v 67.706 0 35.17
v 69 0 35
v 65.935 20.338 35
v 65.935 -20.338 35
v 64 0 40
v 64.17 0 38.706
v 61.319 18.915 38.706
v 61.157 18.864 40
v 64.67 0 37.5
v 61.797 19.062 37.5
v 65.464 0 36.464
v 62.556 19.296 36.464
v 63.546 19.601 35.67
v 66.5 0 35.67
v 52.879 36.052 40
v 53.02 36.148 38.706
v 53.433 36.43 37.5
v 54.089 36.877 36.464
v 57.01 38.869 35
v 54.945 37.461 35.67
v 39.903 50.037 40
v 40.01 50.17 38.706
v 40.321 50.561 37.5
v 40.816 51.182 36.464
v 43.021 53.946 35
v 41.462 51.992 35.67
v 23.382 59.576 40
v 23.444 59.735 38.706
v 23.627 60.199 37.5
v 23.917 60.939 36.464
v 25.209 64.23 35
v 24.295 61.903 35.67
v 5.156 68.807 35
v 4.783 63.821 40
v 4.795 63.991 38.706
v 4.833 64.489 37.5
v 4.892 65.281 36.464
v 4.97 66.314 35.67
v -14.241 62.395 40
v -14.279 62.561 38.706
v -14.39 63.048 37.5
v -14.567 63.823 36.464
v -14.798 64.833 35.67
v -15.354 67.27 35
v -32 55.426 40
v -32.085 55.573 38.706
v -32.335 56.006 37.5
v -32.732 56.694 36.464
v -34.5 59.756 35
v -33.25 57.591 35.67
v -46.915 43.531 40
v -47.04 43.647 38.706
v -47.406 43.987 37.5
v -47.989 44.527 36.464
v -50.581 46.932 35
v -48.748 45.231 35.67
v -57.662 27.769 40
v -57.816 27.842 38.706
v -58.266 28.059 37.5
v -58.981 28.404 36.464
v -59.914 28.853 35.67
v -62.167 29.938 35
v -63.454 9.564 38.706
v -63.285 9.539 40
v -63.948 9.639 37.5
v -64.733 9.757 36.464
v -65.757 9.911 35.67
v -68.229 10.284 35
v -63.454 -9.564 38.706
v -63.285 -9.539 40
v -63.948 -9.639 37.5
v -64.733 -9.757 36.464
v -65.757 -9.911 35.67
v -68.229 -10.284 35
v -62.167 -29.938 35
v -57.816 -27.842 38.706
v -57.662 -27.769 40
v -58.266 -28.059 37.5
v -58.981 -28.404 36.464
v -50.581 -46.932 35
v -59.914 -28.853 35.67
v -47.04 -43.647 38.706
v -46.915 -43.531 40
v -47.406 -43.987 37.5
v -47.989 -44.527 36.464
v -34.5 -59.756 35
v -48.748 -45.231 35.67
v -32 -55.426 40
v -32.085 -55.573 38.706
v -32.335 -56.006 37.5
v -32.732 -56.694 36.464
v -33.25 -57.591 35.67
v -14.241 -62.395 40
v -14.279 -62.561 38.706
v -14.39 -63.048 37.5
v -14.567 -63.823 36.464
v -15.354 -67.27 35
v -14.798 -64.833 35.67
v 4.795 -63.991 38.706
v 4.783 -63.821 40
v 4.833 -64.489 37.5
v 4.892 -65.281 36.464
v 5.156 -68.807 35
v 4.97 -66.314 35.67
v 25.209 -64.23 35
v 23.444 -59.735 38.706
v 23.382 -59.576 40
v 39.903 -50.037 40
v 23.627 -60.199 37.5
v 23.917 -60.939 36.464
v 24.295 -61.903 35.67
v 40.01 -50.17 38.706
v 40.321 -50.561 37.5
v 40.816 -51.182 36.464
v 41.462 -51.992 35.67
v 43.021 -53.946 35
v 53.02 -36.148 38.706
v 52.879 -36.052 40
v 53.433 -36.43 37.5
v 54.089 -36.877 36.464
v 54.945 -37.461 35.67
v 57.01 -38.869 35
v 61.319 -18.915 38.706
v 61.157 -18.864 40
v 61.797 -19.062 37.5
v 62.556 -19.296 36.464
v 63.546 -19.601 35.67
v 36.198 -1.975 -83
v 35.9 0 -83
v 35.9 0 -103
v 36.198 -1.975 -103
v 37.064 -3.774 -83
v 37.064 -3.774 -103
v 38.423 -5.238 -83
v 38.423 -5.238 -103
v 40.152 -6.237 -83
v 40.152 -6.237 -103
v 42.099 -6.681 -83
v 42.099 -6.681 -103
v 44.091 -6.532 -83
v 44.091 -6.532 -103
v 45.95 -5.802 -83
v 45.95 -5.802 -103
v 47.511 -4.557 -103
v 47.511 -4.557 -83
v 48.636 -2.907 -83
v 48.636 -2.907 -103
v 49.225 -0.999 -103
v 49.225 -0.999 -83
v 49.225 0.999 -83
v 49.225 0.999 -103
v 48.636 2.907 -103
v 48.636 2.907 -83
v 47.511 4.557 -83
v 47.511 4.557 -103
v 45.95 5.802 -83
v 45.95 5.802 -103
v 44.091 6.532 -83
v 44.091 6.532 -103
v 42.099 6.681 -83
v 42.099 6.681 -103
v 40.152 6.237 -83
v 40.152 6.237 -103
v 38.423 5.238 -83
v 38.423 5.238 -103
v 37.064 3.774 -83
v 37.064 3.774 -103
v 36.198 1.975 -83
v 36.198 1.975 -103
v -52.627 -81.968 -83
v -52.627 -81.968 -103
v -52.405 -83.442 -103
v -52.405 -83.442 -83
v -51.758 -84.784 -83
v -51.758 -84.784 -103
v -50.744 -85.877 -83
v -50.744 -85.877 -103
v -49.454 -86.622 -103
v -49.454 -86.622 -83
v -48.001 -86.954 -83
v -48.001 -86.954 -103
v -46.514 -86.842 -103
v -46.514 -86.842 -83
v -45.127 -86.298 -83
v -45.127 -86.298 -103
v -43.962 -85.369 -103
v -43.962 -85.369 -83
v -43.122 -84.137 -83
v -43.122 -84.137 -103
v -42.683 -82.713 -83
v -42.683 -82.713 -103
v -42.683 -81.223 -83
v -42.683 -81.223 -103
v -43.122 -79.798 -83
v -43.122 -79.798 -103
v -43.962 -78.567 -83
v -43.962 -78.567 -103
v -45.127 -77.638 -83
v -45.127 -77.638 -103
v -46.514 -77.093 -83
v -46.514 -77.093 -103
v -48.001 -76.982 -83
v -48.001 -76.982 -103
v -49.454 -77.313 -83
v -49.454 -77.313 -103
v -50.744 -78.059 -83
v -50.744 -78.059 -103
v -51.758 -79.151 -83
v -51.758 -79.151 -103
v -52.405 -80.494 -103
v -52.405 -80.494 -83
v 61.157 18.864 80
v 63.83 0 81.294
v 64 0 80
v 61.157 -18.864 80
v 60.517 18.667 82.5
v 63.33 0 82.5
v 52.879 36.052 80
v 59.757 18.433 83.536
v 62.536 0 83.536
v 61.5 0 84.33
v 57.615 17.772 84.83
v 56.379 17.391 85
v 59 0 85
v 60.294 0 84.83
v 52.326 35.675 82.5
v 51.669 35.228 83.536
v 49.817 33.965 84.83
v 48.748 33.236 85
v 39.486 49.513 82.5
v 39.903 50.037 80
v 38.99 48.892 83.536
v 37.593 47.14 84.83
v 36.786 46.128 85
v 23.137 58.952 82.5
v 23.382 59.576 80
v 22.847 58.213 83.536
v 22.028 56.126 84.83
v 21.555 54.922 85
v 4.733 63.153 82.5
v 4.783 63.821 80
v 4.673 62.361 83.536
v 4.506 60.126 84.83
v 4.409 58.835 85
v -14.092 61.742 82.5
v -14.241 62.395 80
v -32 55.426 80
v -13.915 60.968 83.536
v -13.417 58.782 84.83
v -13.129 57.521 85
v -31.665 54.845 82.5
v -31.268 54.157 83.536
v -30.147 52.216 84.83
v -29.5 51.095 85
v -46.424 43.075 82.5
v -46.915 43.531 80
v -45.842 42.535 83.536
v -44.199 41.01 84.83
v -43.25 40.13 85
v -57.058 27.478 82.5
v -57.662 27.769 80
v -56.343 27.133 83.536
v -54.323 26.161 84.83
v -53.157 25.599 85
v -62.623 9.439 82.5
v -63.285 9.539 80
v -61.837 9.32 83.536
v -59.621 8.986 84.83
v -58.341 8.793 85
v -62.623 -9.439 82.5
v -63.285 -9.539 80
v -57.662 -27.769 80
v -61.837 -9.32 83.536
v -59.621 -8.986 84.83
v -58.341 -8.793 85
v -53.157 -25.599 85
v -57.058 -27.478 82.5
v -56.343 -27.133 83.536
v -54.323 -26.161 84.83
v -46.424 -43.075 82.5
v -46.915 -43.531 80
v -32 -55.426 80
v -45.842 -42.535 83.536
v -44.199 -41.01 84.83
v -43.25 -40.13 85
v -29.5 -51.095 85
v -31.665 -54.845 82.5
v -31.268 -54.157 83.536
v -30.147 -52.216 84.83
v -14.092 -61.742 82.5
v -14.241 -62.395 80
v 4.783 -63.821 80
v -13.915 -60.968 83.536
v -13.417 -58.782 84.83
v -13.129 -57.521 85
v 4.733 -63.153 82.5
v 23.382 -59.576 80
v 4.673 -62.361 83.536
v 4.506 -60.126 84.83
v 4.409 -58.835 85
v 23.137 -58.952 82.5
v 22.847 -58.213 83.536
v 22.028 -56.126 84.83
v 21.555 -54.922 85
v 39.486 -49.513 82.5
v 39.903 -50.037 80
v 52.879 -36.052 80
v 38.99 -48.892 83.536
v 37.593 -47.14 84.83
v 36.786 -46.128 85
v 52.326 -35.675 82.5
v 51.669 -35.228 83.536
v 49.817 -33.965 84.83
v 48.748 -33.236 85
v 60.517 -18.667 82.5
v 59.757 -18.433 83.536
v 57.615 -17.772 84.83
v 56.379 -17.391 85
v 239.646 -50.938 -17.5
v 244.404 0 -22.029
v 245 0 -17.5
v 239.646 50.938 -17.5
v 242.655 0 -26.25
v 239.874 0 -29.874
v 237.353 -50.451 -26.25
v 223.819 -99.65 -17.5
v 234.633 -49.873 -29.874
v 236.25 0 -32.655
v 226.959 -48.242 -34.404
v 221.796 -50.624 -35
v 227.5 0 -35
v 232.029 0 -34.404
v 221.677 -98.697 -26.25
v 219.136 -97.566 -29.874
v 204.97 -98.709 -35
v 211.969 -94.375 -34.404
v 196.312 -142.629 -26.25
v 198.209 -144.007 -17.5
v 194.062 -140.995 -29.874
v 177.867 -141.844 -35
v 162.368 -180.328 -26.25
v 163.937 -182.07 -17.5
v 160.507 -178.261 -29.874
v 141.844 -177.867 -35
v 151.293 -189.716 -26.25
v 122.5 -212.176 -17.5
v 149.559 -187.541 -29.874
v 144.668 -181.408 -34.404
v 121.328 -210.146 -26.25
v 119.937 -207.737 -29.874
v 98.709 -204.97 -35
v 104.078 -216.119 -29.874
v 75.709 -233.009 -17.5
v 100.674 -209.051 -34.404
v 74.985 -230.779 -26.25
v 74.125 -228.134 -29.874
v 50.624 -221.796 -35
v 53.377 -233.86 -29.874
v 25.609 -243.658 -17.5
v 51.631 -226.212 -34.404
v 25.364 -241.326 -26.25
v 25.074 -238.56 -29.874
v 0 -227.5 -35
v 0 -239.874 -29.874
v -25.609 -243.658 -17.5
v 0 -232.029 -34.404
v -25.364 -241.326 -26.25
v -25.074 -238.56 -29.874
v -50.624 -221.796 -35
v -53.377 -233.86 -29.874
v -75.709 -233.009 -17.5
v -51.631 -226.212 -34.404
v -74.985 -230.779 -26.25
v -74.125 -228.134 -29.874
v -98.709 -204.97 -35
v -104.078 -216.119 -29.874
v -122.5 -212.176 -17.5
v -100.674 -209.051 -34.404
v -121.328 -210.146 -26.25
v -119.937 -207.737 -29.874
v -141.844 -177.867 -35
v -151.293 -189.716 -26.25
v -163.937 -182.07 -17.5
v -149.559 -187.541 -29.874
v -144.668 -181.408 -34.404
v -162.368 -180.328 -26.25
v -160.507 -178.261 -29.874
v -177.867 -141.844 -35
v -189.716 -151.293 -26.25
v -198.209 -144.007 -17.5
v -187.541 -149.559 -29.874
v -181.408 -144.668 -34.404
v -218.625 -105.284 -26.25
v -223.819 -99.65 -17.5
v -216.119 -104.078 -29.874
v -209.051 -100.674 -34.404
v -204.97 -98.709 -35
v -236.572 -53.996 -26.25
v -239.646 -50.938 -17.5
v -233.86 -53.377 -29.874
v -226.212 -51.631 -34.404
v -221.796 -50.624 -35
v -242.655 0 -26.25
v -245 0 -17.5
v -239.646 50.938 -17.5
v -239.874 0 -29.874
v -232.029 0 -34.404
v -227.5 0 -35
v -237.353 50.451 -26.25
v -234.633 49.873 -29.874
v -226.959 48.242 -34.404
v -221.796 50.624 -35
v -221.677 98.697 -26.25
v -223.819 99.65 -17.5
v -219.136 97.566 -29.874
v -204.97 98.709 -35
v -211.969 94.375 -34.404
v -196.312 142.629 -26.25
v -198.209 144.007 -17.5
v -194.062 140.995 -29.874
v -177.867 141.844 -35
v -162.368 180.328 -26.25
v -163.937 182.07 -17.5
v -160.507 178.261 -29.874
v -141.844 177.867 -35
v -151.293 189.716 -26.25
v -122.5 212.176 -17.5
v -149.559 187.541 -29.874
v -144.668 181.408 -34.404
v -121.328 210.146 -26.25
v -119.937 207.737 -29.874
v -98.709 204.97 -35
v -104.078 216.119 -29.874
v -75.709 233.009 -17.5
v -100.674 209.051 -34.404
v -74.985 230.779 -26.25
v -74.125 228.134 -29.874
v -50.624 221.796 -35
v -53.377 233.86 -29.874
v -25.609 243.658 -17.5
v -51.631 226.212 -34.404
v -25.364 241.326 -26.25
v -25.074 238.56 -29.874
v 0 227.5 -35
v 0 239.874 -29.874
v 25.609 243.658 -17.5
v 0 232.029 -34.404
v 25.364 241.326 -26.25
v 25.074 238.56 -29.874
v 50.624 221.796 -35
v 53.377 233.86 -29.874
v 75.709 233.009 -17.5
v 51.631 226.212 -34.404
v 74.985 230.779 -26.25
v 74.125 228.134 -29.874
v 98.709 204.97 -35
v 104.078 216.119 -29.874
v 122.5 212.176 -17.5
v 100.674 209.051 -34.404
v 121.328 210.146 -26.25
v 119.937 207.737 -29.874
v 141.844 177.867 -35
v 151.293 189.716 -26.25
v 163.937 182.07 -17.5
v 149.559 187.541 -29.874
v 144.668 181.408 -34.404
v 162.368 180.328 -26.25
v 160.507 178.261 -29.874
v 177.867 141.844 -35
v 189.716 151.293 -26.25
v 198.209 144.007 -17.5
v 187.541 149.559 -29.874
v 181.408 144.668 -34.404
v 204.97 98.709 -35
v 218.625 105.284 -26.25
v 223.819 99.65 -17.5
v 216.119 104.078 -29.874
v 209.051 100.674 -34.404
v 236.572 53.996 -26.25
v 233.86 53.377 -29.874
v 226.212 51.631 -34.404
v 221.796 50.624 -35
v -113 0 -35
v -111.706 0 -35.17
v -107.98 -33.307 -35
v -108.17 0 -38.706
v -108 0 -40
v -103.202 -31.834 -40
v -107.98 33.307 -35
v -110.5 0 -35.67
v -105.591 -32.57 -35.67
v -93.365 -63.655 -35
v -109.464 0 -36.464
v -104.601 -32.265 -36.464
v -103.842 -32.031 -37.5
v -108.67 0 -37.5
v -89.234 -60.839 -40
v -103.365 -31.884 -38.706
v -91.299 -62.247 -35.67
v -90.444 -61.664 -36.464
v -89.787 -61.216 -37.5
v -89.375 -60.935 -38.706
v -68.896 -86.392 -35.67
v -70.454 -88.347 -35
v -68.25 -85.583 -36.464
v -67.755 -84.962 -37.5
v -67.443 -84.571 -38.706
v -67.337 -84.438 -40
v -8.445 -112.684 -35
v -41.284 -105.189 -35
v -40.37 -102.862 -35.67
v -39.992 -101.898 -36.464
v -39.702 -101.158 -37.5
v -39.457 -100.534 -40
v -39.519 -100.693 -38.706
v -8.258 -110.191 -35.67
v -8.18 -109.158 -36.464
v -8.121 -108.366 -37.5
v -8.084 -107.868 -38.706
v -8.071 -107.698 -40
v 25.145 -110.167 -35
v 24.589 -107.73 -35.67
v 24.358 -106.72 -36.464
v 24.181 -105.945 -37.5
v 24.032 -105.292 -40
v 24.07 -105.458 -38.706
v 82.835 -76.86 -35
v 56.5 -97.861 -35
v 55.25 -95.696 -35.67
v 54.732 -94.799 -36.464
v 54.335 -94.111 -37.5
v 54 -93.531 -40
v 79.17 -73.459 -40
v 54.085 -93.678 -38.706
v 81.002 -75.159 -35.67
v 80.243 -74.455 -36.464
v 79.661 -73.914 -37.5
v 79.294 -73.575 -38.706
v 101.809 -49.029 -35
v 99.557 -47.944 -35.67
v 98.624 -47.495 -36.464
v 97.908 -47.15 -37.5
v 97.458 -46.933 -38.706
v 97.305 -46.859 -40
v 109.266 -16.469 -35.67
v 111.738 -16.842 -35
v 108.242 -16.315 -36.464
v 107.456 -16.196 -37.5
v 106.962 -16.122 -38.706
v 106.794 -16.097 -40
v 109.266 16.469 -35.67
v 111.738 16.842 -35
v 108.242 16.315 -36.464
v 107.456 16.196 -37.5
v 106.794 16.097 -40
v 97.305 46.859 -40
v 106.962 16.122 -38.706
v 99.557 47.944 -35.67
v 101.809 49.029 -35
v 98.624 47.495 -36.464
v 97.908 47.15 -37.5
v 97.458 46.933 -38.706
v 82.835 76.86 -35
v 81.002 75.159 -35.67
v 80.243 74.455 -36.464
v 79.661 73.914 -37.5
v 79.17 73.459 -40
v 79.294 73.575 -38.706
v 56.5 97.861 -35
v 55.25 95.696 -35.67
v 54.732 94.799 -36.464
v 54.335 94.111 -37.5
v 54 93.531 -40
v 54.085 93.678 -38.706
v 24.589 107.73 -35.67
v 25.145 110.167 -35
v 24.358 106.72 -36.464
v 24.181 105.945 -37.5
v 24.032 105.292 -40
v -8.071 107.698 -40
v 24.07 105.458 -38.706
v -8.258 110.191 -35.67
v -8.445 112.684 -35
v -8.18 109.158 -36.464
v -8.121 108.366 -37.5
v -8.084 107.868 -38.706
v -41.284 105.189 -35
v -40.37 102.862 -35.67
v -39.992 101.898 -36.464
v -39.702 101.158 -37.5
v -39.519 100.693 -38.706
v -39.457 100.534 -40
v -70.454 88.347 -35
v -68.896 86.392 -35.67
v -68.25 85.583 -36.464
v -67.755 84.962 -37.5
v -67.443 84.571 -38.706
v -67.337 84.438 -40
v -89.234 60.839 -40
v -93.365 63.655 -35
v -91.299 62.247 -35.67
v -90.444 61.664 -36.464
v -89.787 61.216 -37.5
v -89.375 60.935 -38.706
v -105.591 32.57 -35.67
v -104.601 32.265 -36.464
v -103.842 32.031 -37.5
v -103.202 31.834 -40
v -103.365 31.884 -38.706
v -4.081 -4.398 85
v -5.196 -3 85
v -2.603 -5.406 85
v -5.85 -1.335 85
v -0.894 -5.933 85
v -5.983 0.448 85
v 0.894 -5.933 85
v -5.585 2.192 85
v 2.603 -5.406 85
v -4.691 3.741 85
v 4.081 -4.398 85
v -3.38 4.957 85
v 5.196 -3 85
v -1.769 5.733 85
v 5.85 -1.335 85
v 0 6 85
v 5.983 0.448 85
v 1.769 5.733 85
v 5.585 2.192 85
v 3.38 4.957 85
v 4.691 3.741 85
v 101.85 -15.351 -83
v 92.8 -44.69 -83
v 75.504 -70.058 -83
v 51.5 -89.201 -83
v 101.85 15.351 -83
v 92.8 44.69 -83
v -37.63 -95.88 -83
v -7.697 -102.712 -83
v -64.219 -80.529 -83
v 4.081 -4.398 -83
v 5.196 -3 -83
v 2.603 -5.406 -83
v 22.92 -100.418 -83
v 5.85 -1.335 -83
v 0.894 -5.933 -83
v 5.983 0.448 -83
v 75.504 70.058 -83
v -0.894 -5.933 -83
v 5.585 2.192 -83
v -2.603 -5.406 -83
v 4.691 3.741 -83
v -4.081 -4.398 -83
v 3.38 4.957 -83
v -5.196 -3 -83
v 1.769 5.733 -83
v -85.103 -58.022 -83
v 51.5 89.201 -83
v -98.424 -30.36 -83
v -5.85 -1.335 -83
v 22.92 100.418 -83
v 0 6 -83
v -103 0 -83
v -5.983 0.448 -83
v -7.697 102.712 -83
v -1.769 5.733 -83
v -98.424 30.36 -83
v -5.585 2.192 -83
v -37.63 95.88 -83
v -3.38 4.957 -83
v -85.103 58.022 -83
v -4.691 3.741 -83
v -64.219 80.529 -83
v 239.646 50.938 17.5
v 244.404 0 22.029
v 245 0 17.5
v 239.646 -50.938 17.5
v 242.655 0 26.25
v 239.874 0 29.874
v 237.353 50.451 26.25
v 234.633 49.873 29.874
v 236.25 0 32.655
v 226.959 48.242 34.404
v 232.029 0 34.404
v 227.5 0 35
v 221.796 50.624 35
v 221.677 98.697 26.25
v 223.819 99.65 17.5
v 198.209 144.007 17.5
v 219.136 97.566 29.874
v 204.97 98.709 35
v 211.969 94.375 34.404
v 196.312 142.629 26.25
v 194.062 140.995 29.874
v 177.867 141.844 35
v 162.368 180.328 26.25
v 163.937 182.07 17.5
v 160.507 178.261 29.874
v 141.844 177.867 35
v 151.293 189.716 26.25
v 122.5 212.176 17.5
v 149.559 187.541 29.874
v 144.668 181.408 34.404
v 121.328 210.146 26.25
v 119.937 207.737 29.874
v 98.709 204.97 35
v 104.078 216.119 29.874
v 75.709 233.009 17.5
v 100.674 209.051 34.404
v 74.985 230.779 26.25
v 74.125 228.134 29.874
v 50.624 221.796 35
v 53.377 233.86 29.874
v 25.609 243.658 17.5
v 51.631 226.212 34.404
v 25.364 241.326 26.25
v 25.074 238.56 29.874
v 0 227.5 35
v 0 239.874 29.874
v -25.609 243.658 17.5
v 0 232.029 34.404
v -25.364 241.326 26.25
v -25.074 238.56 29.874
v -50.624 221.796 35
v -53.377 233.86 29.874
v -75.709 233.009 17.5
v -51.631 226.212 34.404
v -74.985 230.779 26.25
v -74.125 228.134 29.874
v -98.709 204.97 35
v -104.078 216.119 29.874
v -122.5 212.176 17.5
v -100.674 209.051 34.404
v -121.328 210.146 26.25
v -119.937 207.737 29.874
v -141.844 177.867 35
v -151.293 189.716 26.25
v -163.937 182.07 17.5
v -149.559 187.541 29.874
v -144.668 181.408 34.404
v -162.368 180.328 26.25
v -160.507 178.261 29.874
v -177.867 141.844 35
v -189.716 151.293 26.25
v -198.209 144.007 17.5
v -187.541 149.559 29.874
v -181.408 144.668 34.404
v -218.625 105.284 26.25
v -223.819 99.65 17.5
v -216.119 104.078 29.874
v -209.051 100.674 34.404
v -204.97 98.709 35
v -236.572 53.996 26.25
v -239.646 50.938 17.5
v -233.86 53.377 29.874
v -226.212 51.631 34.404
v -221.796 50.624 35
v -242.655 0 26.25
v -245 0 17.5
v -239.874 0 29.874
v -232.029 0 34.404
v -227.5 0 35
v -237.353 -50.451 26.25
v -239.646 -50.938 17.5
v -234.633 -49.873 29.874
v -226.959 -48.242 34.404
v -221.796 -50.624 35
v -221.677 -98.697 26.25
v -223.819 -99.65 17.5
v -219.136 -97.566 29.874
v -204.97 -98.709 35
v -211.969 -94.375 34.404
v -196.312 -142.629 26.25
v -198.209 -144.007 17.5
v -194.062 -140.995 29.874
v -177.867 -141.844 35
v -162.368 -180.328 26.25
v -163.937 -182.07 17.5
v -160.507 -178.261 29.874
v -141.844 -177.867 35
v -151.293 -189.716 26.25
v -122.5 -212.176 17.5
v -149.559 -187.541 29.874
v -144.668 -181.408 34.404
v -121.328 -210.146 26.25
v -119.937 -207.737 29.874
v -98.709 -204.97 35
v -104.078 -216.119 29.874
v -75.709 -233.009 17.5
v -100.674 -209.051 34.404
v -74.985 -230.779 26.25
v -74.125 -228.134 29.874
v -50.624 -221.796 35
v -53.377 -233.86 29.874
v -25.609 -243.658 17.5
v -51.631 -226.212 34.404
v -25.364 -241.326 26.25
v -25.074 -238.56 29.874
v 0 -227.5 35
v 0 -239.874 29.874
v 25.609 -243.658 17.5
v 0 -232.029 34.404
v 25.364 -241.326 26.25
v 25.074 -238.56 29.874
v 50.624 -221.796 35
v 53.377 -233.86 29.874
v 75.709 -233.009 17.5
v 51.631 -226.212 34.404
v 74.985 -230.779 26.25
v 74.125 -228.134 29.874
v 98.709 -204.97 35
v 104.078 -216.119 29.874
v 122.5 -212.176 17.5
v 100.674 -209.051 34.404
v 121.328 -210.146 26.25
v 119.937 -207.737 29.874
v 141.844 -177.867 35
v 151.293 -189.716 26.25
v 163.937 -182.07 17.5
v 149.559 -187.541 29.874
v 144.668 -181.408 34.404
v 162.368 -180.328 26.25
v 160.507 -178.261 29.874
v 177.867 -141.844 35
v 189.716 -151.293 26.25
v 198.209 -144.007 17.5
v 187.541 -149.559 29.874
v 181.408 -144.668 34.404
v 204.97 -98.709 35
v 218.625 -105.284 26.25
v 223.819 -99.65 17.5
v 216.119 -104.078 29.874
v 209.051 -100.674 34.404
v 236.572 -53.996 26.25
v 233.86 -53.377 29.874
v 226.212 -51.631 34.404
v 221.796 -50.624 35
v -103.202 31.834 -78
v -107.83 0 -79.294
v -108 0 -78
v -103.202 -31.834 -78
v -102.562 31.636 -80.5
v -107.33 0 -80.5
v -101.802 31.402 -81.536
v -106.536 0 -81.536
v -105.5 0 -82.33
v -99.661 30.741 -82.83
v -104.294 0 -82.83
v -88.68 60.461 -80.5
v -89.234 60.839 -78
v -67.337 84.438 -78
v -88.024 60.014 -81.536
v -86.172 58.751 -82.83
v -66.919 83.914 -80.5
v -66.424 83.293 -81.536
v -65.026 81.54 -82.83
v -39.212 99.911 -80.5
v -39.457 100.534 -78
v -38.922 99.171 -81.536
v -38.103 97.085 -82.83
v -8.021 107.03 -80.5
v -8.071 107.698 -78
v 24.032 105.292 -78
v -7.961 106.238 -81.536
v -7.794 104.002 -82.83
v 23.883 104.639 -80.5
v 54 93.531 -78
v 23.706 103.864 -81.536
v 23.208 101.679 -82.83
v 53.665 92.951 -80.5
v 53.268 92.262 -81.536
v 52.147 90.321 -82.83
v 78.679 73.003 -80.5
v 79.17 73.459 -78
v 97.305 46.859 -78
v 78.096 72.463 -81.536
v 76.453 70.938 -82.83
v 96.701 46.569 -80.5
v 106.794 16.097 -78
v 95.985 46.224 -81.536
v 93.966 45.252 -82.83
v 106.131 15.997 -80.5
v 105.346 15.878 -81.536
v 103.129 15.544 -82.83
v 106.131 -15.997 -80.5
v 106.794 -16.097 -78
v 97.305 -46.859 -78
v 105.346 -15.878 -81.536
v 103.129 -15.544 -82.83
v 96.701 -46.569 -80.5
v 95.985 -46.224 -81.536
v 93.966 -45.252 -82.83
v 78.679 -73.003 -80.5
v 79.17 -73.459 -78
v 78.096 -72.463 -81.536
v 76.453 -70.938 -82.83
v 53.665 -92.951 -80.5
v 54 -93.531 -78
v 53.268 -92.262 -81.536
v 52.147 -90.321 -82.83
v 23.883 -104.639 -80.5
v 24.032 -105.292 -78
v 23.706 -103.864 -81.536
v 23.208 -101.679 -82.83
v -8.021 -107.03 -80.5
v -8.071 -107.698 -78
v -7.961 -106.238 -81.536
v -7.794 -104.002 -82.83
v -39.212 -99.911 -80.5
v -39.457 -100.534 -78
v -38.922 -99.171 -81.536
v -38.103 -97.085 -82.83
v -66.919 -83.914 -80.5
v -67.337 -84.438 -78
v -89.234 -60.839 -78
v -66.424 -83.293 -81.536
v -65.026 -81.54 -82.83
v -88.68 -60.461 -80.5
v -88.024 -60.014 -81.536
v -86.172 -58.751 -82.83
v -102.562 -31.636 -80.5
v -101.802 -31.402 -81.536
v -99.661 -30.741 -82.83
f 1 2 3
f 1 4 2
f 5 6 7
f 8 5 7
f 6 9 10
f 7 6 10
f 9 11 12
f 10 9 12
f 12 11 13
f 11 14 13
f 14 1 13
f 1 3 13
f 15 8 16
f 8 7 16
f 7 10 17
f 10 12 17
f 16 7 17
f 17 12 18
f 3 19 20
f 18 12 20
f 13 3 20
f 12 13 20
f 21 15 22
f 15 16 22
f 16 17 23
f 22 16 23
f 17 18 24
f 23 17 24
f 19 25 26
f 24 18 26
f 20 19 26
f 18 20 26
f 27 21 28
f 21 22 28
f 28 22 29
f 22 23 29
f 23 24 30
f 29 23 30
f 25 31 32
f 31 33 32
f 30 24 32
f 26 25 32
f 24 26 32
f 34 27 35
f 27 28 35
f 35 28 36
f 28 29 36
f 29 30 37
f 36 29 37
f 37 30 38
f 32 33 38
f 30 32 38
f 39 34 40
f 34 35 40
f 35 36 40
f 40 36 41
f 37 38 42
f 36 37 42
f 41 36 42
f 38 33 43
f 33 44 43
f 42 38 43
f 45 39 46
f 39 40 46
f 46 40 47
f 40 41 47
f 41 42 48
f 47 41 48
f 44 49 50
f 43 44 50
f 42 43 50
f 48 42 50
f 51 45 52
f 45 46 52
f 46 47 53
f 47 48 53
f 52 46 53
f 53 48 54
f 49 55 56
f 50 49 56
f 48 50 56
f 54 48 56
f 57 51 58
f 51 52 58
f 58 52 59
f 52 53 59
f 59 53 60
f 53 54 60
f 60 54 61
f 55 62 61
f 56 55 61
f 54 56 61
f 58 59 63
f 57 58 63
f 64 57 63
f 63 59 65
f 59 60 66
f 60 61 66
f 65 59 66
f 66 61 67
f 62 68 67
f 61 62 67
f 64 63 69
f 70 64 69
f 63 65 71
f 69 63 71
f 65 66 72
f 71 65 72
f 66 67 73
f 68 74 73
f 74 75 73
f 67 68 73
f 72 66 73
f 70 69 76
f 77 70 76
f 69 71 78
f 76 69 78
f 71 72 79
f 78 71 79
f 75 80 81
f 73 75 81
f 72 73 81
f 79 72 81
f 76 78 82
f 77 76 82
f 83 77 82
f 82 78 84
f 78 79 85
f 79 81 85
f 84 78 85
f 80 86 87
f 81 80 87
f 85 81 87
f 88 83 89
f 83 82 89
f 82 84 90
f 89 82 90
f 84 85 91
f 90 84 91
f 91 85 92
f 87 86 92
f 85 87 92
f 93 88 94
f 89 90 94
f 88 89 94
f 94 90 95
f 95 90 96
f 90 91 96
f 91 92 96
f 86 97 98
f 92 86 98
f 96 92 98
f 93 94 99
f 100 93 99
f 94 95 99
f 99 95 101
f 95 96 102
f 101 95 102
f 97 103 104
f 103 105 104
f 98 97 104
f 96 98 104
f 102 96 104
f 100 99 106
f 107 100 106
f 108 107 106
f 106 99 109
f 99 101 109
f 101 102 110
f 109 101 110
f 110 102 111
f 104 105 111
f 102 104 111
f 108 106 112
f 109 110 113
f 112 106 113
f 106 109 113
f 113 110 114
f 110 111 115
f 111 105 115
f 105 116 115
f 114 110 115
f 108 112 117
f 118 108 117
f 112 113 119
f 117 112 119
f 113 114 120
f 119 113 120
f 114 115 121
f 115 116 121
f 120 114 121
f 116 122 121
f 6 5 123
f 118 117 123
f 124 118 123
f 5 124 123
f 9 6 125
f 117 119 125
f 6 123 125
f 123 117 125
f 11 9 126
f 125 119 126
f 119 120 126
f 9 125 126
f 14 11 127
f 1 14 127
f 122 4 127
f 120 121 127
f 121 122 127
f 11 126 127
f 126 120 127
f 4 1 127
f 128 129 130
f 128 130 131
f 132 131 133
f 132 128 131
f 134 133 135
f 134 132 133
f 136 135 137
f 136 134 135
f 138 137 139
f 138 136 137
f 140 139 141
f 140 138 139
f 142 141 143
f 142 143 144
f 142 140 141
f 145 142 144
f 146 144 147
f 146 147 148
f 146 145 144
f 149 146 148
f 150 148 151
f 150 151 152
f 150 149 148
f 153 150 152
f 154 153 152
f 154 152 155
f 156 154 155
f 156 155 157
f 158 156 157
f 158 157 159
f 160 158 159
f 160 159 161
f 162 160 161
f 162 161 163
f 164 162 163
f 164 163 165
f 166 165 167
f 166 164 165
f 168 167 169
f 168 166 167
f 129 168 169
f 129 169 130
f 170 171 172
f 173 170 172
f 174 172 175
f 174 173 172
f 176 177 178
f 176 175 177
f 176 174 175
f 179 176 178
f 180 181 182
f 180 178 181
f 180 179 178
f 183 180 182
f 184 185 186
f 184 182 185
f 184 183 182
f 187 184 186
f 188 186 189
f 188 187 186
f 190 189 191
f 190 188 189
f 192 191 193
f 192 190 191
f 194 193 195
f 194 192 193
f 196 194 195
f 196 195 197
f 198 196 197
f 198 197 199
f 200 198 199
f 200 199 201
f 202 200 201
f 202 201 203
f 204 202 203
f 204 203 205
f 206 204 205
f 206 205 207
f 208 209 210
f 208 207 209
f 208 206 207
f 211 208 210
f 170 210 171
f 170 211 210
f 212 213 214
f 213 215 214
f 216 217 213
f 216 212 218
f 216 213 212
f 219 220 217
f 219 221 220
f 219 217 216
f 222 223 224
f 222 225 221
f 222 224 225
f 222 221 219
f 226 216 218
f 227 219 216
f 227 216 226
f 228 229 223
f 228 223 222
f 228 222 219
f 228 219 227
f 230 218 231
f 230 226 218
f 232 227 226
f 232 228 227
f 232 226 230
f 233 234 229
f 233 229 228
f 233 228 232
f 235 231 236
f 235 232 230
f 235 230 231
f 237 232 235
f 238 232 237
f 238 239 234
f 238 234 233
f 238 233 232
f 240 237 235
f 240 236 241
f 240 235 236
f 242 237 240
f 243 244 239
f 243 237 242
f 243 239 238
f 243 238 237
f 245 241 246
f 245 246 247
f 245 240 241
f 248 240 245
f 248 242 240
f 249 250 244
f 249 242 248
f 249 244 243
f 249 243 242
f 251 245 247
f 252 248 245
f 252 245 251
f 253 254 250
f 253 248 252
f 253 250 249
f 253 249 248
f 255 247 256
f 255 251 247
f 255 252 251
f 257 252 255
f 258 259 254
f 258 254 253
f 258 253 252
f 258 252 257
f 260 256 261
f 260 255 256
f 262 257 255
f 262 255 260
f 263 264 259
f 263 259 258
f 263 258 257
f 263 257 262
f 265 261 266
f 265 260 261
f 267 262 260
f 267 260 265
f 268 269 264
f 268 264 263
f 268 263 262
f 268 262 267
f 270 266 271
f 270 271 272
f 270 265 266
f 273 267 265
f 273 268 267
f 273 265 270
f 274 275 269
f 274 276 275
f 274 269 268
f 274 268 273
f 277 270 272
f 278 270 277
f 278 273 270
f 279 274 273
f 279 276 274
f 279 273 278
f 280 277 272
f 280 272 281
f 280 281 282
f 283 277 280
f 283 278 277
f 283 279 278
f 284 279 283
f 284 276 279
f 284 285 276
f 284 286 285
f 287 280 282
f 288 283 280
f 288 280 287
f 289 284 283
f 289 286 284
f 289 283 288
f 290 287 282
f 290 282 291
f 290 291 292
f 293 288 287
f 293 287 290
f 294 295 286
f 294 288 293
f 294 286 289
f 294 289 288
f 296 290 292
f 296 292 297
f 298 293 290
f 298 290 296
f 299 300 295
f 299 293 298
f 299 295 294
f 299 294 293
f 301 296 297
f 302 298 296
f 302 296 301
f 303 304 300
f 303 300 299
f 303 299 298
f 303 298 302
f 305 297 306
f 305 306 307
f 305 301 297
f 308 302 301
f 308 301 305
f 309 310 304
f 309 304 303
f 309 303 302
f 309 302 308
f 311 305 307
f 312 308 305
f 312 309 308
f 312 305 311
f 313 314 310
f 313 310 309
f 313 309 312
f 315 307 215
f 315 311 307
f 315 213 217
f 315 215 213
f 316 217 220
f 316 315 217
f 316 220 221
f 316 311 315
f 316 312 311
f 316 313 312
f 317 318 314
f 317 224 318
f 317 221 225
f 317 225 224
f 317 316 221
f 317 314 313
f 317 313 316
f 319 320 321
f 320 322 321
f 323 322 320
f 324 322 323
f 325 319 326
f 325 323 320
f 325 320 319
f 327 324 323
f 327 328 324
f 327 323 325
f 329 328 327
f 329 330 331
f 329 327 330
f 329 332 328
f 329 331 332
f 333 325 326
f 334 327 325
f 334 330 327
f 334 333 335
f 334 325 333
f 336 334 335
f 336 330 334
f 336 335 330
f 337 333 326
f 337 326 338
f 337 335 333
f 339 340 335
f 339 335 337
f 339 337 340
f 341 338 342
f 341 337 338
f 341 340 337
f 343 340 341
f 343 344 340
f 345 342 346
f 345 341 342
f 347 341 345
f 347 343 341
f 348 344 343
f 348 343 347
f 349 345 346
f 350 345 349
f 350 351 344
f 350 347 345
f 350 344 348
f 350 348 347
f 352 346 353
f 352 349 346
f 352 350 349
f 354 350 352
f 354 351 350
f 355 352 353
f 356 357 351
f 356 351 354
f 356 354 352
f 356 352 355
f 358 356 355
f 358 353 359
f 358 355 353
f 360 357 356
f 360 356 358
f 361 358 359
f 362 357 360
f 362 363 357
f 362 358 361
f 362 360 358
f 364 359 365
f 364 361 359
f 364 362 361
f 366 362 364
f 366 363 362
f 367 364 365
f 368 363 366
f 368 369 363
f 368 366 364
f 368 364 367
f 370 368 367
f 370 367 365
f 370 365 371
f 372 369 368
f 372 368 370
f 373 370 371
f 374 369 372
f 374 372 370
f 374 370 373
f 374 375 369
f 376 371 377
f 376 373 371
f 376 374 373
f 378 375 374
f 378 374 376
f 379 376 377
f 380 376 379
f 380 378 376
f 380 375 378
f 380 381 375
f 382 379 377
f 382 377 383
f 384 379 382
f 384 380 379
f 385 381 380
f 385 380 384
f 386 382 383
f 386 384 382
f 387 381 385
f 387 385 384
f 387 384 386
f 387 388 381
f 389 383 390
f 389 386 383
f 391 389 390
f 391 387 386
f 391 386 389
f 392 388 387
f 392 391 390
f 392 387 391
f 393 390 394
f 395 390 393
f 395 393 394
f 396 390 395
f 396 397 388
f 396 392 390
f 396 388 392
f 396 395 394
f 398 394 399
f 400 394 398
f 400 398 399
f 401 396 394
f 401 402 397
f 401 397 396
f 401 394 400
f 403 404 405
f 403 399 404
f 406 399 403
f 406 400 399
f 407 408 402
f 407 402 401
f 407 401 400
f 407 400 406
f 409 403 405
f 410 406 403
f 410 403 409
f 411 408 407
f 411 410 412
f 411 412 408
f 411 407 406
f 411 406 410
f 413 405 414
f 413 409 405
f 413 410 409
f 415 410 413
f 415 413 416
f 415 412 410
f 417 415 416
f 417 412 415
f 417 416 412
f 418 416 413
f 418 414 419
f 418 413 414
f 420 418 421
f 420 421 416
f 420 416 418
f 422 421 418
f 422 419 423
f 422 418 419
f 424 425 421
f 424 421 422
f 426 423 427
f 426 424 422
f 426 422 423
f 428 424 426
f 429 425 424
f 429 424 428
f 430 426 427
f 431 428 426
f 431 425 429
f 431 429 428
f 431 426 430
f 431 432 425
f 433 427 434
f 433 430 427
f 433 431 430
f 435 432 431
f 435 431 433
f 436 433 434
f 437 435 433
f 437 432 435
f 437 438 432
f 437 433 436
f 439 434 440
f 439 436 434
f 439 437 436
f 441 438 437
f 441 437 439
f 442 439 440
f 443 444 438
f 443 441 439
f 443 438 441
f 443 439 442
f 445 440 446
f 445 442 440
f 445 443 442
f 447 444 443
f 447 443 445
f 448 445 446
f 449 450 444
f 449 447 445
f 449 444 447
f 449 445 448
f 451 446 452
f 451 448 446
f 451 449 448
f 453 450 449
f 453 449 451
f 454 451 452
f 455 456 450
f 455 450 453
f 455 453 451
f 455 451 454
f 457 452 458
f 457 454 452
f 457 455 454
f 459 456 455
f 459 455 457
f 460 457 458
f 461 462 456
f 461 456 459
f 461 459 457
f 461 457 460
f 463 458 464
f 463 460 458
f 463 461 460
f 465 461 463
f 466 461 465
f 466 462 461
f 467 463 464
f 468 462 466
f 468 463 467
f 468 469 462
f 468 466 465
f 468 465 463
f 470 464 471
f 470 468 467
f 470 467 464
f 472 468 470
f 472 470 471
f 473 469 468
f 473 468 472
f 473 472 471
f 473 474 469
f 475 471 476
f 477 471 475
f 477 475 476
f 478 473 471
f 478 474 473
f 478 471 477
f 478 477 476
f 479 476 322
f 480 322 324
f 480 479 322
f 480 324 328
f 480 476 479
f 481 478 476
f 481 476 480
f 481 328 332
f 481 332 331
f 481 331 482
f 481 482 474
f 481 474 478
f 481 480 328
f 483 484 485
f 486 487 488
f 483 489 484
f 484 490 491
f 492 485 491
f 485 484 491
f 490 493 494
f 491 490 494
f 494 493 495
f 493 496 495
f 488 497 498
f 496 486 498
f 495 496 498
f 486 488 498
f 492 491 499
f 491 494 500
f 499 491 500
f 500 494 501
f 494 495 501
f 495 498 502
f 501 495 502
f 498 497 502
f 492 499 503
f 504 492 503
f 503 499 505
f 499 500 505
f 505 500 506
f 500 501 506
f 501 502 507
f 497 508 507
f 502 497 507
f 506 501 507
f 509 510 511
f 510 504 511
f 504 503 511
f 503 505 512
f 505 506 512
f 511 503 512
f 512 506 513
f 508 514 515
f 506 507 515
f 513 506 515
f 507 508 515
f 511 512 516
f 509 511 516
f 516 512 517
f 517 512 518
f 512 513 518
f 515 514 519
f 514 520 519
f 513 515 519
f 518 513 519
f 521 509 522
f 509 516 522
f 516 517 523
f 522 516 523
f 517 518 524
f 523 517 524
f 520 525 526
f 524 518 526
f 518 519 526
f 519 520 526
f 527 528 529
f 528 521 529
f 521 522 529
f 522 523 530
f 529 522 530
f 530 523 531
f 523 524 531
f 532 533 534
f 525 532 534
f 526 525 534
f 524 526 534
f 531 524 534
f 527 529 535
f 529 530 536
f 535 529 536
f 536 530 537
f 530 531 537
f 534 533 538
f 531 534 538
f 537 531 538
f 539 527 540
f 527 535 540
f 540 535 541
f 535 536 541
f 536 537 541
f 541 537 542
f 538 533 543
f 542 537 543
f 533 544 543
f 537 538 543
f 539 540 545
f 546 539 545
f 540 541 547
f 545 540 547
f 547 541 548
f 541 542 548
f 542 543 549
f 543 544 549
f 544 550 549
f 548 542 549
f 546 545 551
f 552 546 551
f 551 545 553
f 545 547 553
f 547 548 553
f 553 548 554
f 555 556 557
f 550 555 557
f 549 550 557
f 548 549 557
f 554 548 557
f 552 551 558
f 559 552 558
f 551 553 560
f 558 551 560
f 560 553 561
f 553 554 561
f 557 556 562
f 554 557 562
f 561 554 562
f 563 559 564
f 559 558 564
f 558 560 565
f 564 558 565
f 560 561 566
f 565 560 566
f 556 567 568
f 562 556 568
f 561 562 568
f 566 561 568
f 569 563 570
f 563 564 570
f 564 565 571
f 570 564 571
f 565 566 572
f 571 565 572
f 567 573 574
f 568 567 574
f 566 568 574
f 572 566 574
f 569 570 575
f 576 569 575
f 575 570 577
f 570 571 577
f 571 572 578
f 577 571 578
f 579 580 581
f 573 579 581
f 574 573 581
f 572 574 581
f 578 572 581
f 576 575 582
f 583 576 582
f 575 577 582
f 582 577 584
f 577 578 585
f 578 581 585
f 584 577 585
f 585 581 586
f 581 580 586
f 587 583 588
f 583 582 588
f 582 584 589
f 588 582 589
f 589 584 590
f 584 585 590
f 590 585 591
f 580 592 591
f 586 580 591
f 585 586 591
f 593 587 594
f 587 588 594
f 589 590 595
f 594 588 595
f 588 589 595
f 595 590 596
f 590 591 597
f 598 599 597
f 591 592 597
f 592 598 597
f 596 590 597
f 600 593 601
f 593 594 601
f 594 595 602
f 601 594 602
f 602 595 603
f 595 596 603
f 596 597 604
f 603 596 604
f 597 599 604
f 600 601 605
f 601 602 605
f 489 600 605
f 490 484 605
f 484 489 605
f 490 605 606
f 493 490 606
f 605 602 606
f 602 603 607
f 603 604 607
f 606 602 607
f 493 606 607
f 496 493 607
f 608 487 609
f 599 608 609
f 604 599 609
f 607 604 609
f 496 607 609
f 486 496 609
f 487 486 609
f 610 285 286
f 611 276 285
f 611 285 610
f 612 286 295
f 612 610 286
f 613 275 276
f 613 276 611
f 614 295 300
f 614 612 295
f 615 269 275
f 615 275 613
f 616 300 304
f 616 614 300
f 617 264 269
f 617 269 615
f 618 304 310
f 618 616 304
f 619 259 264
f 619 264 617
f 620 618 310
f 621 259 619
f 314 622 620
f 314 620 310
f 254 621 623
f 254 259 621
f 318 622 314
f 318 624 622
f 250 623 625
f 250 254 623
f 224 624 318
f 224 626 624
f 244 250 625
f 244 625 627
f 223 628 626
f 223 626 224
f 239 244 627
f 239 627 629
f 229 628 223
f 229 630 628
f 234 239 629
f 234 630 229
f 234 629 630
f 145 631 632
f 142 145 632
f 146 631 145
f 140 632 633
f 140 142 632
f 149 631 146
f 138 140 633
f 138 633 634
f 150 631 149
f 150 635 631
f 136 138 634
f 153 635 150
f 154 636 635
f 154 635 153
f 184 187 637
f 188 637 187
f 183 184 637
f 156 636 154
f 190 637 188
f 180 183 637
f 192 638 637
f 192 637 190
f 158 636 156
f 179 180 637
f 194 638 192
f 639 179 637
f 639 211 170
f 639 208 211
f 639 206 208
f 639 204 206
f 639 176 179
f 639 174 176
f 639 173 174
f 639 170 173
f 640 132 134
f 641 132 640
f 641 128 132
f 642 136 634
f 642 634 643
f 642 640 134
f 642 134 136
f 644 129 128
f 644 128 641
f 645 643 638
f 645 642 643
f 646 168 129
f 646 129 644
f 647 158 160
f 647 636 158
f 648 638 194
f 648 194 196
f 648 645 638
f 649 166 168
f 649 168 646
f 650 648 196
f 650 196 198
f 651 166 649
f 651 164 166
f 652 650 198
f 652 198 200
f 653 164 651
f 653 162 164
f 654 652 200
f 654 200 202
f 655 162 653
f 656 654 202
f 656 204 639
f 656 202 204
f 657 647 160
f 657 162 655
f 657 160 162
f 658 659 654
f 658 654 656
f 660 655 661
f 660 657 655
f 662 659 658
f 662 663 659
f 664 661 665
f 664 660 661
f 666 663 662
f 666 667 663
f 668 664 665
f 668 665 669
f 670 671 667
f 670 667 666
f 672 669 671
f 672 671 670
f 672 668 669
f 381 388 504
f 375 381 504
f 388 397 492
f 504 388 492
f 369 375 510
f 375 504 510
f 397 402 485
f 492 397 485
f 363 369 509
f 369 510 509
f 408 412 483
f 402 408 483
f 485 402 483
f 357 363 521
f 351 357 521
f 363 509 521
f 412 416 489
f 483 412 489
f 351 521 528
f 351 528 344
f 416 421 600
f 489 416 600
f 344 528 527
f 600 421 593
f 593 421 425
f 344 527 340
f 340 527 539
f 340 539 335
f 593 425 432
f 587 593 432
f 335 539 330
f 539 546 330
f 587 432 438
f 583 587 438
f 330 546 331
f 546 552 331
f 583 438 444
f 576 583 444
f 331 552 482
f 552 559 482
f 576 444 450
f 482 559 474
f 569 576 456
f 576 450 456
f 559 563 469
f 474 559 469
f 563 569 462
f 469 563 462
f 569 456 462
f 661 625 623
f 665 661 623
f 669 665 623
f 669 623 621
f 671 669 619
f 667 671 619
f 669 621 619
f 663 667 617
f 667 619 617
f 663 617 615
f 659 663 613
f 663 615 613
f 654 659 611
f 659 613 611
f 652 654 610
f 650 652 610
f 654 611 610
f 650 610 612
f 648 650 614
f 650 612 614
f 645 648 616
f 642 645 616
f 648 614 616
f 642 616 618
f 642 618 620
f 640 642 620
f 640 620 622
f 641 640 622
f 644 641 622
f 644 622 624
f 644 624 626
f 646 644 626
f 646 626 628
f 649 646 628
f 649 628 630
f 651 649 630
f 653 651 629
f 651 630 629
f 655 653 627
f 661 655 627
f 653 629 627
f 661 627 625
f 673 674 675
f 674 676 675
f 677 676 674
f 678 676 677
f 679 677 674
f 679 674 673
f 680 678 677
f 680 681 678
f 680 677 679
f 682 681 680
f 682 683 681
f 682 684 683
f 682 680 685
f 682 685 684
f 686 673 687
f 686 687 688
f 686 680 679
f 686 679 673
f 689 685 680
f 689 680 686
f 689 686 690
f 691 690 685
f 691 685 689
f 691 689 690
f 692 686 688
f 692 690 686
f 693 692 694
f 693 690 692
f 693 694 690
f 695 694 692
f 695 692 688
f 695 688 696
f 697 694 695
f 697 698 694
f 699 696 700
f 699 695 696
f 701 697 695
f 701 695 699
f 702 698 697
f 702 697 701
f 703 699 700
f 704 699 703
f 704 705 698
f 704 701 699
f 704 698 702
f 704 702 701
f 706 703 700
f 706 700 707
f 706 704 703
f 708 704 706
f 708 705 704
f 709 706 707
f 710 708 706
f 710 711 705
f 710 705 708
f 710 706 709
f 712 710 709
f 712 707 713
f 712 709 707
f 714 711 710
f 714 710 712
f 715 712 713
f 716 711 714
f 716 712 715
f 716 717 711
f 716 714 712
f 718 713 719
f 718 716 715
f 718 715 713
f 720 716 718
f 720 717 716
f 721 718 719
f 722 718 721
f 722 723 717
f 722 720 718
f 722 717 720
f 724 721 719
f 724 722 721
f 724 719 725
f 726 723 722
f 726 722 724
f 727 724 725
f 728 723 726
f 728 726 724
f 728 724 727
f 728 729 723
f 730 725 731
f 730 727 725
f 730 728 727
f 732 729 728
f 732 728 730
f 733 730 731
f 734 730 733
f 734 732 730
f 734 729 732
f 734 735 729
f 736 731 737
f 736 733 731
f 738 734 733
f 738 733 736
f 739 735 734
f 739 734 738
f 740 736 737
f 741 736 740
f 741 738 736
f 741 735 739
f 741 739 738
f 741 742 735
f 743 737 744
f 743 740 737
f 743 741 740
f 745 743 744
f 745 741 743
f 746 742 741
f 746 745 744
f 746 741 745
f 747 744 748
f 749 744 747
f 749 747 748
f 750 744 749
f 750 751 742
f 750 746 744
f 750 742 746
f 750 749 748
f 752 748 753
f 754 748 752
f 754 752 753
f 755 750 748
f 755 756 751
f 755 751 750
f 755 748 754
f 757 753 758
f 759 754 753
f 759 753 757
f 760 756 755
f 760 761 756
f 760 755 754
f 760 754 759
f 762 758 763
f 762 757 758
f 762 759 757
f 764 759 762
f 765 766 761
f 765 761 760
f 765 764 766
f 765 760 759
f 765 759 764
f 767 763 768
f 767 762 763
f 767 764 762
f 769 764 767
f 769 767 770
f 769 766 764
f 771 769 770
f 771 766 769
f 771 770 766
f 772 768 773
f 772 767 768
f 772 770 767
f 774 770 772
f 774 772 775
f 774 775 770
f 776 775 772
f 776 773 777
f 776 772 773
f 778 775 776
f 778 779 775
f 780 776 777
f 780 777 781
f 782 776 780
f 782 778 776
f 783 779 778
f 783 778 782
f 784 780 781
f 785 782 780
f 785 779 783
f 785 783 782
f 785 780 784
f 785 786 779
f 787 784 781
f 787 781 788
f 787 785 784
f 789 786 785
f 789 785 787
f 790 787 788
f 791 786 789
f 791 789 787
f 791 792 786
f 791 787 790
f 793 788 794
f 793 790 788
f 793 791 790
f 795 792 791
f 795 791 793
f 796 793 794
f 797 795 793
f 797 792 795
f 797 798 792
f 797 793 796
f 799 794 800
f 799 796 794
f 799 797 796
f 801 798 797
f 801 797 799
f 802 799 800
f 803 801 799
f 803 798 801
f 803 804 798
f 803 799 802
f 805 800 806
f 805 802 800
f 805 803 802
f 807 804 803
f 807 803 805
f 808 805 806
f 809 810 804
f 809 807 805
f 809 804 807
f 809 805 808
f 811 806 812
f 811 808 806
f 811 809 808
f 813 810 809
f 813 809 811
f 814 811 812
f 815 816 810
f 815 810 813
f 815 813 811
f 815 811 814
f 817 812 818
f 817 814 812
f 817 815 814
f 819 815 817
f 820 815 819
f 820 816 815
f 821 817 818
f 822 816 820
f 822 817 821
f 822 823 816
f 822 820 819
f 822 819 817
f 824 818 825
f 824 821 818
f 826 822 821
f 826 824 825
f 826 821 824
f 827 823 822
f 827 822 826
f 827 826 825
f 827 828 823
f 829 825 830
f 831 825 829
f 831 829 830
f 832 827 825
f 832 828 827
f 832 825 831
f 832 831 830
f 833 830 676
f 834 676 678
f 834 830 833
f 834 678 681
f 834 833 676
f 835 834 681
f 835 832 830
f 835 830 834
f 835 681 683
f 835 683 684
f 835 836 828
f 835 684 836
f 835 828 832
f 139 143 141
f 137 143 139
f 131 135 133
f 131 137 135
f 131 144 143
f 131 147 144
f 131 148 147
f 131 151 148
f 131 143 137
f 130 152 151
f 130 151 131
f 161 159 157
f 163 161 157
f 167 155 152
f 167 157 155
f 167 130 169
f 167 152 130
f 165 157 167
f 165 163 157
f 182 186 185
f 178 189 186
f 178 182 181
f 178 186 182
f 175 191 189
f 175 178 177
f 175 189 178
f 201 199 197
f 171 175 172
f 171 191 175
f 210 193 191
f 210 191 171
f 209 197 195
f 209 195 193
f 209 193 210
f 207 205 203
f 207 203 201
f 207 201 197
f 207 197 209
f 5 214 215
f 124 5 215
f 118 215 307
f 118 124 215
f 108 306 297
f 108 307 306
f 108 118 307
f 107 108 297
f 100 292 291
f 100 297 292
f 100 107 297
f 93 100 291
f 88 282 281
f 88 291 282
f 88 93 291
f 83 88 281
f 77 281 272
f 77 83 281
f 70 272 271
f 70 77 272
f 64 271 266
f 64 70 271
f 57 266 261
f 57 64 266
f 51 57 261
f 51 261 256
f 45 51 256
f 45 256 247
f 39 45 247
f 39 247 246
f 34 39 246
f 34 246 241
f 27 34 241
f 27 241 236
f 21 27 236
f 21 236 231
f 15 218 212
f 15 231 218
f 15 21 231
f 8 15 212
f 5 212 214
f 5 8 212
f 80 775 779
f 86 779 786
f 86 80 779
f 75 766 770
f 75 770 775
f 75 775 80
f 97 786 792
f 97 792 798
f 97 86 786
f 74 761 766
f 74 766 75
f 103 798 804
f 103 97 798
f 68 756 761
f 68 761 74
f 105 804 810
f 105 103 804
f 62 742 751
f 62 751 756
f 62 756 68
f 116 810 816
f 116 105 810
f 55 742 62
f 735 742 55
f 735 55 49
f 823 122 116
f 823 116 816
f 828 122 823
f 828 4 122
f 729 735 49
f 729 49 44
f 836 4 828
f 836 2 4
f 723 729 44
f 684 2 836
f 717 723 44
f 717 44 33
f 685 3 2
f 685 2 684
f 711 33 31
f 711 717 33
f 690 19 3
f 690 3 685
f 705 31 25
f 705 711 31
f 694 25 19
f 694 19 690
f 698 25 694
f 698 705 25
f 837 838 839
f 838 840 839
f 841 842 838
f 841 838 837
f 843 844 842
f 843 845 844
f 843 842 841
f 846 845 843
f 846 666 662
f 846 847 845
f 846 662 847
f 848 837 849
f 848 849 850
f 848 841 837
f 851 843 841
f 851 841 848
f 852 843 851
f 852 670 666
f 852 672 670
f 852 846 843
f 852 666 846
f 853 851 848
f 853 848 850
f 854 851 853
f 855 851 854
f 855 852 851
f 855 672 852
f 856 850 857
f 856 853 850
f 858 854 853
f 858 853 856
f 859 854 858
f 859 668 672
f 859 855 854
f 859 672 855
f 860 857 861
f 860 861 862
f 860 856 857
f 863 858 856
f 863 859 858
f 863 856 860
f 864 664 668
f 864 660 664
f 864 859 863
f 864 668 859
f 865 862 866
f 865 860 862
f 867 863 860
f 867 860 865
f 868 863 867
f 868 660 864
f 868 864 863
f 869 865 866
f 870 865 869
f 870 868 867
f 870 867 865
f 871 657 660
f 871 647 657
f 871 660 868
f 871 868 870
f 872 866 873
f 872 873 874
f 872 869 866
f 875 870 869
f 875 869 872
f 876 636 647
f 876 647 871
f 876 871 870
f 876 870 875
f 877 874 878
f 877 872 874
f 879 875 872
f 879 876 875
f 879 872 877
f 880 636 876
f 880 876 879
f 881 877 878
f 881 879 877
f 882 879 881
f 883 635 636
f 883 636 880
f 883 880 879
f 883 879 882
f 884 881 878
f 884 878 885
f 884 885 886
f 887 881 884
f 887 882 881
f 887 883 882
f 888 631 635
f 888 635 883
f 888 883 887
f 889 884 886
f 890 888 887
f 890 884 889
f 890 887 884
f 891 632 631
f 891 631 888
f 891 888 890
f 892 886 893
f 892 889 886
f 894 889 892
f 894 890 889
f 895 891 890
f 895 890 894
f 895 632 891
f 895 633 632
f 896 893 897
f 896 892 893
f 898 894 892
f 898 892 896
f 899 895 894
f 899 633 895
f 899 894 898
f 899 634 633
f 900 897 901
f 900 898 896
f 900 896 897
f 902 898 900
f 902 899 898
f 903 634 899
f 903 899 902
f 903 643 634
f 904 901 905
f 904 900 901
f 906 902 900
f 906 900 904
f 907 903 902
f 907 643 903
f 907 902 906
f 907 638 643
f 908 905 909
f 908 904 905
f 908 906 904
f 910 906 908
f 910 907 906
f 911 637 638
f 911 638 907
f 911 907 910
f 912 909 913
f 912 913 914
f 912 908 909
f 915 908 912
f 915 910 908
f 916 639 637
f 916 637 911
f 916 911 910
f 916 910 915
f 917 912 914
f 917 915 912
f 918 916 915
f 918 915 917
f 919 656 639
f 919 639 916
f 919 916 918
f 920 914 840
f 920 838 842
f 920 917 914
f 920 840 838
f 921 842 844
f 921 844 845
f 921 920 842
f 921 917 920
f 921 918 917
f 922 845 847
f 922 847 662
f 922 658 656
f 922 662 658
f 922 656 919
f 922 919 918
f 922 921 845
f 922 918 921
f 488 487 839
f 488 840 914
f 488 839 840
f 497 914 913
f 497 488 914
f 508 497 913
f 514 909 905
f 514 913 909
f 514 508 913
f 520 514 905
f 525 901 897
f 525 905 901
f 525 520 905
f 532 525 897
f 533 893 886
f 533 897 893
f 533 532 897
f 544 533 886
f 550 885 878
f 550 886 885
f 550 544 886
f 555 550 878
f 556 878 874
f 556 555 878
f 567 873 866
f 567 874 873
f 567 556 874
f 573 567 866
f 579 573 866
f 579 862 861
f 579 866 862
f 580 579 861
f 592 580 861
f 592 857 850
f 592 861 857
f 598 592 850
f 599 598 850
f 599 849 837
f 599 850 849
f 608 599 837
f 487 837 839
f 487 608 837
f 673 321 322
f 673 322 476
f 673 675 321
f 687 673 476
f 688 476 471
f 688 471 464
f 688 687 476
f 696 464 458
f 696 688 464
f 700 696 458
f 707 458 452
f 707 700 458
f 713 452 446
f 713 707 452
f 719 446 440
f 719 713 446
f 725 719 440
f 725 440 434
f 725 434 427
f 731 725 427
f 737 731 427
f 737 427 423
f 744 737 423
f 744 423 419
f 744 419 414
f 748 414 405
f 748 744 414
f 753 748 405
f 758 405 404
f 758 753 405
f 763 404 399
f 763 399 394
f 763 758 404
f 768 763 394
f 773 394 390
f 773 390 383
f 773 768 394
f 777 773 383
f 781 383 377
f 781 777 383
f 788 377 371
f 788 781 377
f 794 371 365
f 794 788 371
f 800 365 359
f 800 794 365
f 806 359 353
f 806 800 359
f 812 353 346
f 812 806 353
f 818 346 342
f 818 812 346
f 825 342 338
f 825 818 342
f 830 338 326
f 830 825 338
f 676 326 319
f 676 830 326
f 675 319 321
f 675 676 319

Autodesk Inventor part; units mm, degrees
ref_plane "YZ Plane" through (0, 0, 0) normal (1, 0, 0) x (0, 1, 0)
ref_plane "XY Plane" through (0, 0, 0) normal (0, 0, 1) x (1, 0, 0)
sketch "スケッチ1" plane through (0, 0, 0) normal (0, 0, 1) x (1, 0, 0)
  circle A0 centre (0, 0) radius 245
  dimension "d0" = 490
extrude "押し出し1" add sketch "スケッチ1" along normal mid plane 70
fillet "フィレット1" radius 17.5 2 edges at (-245, 0, 35) (-245, 0, -35)
sketch "スケッチ8" plane through (0, 0, 35) normal (0, 0, 1) x (1, 0, 0)
  circle A0 centre (0, 0) radius 64
  dimension "d11" = 128
extrude "押し出し2" add sketch "スケッチ8" along normal blind 50
sketch "スケッチ9" plane through (0, 0, -35) normal (0, 0, -1) x (-1, 0, 0)
  circle A0 centre (0, 0) radius 108
  dimension "d14" = 216
extrude "押し出し3" add sketch "スケッチ9" along normal blind 48
fillet "フィレット2" radius 5 1 edges at (-64, 0, 85)
fillet "フィレット3" radius 5 1 edges at (-64, 0, 35)
fillet "フィレット4" radius 5 2 edges at (108, 0, -83) (108, 0, -35)
sketch "スケッチ10" plane through (0, 0, -83) normal (0, 0, -1) x (-1, 0, 0)
  point P0 (0, 0)
  point P1 (0, 0)
hole "穴2" at (0, 0, -83) direction (0, 0, 1) diameter 12 end through all
sketch "スケッチ12" plane through (0, 0, 85) normal (0, 0, 1) x (1, 0, 0)
  line L0 (-51.2549, 22.4229) -> (29.3453, 22.4229) construction
  line L1 (29.3453, 22.4229) -> (29.3453, -28.267) construction
  line L2 (29.3453, -28.267) -> (-51.2549, -28.267) construction
  line L3 (-51.2549, -28.267) -> (-51.2549, 22.4229) construction
  point P0 (0, 0)
sketch "スケッチ13" plane through (0, 0, -83) normal (0, 0, -1) x (-1, 0, 0)
  line L0 (-79.0903, 45.7594) -> (75.7007, 45.7594) construction
  line L1 (75.7007, 45.7594) -> (75.7007, -24.292) construction
  line L2 (75.7007, -24.292) -> (-79.0903, -24.292) construction
  line L3 (-79.0903, -24.292) -> (-79.0903, 45.7594) construction
  point P0 (0, 0)
sketch "スケッチ14" plane through (0, 0, -35) normal (0, 0, -1) x (-1, 0, 0)
  line L0 (-67.9, 178.6198) -> (94.9078, 178.6198) construction
  line L1 (94.9078, 178.6198) -> (94.9078, 134.9225) construction
  line L2 (94.9078, 134.9225) -> (-67.9, 134.9225) construction
  line L3 (-67.9, 134.9225) -> (-67.9, 178.6198) construction
  point P0 (0, 0)
sketch "スケッチ15" plane through (0, 0, -83) normal (0, 0, -1) x (-1, 0, 0)
  circle A0 centre (0, 0) radius 42.6 construction
  circle A1 centre (-42.6, 0) radius 6.7
  circle A2 centre (-42.6, 0) radius 121.9 construction
  circle A3 centre (0, 0) radius 94.8 construction
  circle A4 centre (47.6269, -81.9678) radius 5
  line L0 (-343, 0) -> (343, 0) projected
  dimension "d27" = 85.2
  dimension "d29" = 243.8
  dimension "d30" = 189.6
  dimension "d28" = 13.4
  dimension "d31" = 10
extrude "押し出し4" add sketch "スケッチ15" along normal blind 20 contours L0 A1 | A1 L0
extrude "押し出し5" add sketch "スケッチ15" along normal blind 20 contours A4
properties part number "前輪"
